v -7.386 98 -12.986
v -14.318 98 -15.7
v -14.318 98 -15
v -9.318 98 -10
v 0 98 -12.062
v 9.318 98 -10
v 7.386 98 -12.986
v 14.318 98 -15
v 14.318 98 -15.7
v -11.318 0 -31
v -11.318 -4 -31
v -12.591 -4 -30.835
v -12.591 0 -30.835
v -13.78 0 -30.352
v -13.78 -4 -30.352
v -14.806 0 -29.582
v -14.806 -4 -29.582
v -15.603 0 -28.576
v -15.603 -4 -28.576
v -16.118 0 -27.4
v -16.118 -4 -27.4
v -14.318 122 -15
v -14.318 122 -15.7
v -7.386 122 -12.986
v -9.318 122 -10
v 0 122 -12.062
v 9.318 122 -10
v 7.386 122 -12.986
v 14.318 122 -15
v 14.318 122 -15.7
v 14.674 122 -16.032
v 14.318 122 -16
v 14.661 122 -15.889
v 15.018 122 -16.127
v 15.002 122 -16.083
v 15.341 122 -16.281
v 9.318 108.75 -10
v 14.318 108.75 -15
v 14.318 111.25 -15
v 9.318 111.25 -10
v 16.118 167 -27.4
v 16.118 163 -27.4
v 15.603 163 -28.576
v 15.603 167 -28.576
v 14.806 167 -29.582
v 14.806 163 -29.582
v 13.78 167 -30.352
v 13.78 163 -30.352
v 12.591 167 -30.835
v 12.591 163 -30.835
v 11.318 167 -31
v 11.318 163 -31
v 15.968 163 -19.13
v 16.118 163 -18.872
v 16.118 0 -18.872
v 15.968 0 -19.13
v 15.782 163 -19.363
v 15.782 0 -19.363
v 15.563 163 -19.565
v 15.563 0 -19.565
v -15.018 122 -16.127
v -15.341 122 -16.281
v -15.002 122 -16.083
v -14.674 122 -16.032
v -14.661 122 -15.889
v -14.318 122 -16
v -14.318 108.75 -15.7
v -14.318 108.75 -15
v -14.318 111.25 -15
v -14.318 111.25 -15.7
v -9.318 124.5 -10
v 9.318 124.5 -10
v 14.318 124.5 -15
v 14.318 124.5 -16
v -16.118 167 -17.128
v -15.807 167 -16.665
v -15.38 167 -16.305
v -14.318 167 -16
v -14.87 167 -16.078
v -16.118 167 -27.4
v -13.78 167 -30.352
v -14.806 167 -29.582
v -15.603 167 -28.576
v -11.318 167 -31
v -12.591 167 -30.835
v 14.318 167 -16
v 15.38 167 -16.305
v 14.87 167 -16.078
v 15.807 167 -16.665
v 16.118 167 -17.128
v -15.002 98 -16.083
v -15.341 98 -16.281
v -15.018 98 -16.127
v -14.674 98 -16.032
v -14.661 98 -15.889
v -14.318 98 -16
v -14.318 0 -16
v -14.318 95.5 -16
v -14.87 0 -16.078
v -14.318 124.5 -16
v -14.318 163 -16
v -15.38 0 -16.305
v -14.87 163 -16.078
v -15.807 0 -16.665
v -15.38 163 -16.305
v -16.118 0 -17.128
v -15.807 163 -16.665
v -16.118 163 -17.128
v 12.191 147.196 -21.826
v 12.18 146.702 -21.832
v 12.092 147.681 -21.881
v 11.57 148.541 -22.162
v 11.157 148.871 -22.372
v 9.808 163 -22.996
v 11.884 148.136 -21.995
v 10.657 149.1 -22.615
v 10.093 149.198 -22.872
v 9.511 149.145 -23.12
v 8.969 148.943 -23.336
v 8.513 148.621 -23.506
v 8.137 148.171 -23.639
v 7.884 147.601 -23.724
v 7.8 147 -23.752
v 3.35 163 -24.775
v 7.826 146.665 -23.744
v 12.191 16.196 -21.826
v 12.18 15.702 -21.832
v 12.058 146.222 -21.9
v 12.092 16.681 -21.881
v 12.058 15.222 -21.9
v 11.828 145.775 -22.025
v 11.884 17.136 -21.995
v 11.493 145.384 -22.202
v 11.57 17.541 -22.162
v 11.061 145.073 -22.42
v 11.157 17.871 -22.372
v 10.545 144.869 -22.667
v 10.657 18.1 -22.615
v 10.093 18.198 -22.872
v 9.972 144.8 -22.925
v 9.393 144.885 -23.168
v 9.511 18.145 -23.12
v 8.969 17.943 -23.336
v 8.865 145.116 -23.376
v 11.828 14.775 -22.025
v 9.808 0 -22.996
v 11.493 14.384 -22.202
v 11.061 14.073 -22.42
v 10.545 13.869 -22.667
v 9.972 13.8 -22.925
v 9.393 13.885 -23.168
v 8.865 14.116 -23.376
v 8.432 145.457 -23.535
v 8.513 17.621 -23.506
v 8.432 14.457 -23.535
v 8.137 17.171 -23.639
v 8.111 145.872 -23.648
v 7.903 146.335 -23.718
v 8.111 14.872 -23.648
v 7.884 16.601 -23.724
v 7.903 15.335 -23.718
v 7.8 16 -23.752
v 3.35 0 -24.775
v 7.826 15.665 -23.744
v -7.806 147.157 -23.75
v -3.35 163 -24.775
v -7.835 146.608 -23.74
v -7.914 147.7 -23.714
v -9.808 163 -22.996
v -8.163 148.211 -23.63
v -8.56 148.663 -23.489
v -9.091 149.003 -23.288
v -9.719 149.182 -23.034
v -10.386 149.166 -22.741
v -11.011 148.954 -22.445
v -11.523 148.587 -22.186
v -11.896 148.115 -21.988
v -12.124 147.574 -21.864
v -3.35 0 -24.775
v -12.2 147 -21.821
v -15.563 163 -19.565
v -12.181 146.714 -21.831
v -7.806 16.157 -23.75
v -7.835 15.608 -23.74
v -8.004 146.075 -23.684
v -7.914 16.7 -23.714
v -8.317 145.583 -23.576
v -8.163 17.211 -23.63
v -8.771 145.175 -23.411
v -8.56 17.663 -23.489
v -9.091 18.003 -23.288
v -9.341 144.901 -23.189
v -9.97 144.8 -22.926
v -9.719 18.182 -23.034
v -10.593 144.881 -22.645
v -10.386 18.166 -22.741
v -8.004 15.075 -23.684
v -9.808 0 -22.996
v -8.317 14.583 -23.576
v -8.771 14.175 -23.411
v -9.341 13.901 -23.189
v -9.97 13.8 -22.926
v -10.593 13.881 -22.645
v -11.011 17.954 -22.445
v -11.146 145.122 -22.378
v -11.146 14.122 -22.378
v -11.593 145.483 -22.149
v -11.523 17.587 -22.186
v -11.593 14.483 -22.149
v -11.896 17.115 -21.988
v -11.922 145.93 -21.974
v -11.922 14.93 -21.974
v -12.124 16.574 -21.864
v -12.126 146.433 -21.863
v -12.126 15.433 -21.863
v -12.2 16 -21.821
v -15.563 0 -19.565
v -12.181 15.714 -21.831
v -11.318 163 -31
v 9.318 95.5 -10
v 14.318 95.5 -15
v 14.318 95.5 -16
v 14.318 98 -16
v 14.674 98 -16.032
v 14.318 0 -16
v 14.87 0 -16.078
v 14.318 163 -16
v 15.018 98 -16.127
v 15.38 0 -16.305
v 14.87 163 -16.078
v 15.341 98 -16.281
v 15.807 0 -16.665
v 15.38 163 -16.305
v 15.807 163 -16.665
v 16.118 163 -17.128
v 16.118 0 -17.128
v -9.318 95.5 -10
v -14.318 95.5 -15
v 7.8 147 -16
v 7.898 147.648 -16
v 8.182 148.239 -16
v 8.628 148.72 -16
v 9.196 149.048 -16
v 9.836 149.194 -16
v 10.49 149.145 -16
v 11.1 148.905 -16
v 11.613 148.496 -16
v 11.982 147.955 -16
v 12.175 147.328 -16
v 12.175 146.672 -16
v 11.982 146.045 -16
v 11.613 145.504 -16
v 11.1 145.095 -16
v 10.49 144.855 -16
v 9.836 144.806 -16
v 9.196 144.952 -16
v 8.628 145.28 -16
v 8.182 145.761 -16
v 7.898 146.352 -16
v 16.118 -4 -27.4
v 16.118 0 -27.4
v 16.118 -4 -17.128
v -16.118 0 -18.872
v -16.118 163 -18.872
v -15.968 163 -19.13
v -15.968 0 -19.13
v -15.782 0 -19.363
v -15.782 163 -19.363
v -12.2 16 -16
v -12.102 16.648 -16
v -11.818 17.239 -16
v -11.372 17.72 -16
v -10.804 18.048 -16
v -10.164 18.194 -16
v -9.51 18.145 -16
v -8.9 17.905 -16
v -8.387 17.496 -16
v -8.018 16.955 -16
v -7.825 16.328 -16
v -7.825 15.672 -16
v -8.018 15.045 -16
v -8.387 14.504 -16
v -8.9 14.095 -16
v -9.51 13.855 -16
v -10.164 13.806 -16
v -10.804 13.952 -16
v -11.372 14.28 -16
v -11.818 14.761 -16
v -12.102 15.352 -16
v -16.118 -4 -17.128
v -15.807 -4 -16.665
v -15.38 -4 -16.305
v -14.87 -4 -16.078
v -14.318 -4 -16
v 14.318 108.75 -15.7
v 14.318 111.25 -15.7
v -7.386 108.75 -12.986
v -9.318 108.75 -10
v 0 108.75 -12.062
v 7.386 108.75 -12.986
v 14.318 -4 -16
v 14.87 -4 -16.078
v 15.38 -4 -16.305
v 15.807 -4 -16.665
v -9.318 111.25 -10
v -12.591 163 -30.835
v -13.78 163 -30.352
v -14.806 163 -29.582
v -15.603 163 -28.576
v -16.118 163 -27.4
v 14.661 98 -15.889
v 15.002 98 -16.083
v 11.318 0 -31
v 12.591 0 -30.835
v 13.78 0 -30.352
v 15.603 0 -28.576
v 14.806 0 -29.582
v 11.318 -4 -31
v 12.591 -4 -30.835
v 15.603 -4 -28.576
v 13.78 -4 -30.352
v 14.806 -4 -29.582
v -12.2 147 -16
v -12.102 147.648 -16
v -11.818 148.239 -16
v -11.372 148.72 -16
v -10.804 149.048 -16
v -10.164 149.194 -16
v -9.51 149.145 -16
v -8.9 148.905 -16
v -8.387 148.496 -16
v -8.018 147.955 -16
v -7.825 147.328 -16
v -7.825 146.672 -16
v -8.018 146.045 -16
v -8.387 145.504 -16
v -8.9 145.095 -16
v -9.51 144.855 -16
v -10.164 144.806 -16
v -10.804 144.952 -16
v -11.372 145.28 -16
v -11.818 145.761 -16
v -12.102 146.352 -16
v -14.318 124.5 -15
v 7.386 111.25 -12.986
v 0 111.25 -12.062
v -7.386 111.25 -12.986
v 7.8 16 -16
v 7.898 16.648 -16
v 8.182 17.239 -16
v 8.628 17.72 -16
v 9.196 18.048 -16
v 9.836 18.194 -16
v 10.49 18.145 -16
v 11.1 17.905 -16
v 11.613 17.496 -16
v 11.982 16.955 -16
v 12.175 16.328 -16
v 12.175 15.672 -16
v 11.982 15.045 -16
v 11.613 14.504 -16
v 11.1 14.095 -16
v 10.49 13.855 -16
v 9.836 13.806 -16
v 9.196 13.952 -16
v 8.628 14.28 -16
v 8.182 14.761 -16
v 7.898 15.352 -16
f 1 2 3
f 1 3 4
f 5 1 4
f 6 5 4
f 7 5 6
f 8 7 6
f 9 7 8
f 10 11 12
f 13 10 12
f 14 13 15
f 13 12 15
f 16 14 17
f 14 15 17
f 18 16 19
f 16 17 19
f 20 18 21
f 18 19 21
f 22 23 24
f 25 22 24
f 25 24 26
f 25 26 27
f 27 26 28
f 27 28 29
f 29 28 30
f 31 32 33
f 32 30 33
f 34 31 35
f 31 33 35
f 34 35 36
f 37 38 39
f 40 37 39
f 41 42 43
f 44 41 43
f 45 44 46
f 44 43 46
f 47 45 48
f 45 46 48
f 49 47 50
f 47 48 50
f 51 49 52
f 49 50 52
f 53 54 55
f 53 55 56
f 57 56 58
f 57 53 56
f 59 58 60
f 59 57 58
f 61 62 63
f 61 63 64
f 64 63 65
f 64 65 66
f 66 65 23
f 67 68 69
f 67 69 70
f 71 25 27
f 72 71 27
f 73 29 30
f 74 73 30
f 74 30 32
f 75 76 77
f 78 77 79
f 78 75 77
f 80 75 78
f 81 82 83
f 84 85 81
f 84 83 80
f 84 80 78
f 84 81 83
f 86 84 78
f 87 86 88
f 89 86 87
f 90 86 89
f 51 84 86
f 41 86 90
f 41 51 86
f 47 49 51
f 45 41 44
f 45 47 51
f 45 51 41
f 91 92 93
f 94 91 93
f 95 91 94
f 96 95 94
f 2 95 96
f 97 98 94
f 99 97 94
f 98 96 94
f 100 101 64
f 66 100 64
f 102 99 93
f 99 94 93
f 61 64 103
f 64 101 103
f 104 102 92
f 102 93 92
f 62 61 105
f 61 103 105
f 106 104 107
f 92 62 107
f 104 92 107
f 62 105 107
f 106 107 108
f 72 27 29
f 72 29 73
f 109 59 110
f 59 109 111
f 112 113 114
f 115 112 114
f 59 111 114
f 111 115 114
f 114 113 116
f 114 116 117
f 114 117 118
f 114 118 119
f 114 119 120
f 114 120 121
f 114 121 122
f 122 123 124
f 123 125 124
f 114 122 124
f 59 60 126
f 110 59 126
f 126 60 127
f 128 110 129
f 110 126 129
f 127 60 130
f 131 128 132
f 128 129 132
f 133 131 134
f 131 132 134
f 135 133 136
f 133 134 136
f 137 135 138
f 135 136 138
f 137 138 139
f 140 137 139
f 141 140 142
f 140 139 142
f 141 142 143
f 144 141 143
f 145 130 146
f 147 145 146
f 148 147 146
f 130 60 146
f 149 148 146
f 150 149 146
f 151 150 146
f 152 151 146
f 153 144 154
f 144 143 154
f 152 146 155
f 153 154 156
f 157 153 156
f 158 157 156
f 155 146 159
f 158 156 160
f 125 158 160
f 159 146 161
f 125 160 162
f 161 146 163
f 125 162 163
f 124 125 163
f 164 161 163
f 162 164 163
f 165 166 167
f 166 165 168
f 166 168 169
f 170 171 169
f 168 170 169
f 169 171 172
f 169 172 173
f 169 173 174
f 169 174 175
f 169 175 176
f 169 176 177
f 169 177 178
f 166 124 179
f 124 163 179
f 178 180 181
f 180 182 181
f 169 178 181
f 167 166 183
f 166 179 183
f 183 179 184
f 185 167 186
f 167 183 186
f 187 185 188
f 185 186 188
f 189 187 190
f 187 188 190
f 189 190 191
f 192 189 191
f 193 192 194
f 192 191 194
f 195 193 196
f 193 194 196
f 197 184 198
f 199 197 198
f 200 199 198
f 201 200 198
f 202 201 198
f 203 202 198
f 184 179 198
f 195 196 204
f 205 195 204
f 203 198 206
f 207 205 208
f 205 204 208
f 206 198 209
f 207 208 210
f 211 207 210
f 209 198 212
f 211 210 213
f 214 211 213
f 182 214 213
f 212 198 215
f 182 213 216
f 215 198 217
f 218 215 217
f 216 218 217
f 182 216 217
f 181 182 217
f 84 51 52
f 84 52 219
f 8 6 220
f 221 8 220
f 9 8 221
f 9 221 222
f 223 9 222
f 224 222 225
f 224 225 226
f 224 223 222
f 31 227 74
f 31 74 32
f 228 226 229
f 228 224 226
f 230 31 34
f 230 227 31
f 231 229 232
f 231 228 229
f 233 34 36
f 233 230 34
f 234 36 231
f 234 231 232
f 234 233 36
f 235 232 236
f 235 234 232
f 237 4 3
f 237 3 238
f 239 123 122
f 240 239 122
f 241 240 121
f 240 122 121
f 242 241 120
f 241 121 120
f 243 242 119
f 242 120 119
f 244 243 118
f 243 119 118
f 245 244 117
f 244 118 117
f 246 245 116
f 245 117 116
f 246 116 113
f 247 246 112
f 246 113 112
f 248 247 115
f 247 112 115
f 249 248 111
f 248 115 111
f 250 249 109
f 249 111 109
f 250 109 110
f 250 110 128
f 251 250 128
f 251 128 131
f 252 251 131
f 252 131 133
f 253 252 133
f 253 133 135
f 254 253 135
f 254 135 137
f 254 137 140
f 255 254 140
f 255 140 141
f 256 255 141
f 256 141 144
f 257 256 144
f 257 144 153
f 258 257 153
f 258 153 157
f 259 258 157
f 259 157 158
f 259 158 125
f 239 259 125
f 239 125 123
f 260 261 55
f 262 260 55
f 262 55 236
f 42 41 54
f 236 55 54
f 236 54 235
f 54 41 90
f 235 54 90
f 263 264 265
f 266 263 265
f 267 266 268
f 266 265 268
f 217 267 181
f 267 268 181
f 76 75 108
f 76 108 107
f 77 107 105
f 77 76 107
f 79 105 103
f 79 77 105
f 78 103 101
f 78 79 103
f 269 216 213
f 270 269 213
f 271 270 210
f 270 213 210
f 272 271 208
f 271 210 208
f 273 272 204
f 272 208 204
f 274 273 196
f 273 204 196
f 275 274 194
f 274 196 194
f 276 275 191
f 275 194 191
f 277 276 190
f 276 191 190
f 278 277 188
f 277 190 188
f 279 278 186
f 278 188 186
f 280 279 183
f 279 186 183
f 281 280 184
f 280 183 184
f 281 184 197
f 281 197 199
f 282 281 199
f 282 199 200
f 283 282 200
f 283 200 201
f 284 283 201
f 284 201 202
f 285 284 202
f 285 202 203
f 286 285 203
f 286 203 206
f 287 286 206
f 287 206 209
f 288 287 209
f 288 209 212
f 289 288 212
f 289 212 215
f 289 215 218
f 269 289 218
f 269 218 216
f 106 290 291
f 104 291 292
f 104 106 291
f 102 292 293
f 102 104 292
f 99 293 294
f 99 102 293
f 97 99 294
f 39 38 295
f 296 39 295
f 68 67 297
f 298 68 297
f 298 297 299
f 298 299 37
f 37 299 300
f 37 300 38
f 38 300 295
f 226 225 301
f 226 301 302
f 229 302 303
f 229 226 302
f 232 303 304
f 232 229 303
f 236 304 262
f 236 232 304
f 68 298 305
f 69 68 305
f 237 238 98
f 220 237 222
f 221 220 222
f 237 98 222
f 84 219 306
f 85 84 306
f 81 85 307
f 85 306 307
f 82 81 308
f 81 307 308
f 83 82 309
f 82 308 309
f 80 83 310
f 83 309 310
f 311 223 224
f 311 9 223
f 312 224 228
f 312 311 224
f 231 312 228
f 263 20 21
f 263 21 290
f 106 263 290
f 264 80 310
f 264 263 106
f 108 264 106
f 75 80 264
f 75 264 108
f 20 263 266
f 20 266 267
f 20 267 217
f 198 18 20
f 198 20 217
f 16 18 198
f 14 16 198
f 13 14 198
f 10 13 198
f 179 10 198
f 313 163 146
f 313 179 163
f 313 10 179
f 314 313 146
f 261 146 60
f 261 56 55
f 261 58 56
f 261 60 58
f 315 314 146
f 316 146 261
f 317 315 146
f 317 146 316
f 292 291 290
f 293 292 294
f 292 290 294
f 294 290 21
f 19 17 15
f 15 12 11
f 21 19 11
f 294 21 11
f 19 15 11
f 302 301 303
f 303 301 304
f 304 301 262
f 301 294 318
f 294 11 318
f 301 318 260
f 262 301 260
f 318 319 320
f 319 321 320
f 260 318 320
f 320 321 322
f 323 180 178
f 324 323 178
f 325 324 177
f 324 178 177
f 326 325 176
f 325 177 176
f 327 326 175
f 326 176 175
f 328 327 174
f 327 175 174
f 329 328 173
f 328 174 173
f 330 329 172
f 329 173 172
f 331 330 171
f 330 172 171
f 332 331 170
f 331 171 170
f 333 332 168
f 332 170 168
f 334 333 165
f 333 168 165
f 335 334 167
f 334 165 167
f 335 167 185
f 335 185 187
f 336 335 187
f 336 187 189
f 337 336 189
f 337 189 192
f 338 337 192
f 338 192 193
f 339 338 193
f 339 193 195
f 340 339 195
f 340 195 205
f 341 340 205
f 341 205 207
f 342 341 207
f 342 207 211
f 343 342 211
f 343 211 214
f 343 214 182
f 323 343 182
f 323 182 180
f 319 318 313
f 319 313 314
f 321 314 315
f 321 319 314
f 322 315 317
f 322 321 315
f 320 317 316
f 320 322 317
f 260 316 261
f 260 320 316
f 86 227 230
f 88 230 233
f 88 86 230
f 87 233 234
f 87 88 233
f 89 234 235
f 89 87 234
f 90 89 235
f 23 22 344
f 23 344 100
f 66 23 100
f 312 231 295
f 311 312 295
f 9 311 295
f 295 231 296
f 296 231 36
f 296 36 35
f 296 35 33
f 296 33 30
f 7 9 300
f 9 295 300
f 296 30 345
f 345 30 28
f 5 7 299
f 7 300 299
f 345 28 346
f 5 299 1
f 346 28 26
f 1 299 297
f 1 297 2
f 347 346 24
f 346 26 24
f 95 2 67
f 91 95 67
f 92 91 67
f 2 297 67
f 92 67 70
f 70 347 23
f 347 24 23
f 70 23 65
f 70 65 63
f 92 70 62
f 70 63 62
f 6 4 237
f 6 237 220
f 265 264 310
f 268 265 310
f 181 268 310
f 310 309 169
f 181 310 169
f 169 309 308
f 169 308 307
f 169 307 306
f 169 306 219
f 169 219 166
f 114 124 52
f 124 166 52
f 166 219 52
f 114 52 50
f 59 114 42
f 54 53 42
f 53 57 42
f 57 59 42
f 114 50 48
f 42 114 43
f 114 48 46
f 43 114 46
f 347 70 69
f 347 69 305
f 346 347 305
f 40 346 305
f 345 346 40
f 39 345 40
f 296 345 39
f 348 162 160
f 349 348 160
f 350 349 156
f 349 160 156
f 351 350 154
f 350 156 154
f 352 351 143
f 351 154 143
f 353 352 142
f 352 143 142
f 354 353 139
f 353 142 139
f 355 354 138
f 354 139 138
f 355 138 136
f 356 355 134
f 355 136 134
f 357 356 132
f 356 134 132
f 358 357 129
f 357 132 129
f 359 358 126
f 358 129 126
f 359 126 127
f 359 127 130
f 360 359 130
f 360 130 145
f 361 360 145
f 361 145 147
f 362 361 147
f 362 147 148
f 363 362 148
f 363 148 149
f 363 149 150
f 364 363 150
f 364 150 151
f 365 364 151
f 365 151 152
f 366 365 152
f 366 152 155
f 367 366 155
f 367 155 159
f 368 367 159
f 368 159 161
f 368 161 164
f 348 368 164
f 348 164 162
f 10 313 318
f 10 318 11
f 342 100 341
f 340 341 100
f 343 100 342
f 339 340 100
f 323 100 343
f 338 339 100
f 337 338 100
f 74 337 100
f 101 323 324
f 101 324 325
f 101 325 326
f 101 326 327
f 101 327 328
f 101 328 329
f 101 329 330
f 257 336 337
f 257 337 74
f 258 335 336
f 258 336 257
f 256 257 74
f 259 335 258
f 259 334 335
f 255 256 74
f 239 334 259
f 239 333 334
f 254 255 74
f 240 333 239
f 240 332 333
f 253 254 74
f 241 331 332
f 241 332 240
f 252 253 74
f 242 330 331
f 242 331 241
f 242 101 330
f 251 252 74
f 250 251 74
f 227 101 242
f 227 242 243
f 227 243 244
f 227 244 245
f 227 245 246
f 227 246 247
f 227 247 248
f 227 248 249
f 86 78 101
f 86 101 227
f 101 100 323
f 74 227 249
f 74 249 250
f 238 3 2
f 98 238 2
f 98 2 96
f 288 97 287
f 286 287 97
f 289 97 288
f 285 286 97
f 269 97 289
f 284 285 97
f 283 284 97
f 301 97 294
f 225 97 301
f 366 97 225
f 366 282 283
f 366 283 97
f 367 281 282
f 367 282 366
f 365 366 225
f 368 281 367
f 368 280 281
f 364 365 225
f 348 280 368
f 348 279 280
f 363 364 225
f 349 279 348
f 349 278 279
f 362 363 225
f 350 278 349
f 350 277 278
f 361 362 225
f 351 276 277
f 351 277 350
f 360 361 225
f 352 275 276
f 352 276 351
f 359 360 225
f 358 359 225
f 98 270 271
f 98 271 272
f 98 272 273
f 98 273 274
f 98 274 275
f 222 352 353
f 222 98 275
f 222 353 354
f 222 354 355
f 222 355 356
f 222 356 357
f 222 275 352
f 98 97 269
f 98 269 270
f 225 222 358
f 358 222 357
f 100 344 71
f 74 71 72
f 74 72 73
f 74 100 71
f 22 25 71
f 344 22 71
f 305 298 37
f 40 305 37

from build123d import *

# Parameters (mm, degrees)
BOSS_EXTRUDE1_DEPTH        = 163
FILLET1_R                  = 2
BOSS_EXTRUDE3_START        = 4
BOSS_EXTRUDE3_DEPTH        = 4
BOSS_EXTRUDE4_START        = -163
BOSS_EXTRUDE4_DEPTH        = 4
FILLET2_R                  = 5
BOSS_EXTRUDE5_START        = -126
BOSS_EXTRUDE5_DEPTH        = 24
SKETCH4_W                  = 28.635642126
SKETCH4_H                  = 6
BOSS_EXTRUDE6_DEPTH        = 2.5
BOSS_EXTRUDE7_START        = -24
SKETCH4_2_W                = 28.635642126
SKETCH4_2_H                = 6
BOSS_EXTRUDE7_DEPTH        = 2.5
BOSS_EXTRUDE8_DEPTH        = 1.25
BOSS_EXTRUDE8_DEPTH_BACK   = 1.25
BOSS_EXTRUDE8_START        = -12
SKETCH4_3_W                = 28.635642126
SKETCH4_3_H                = 6
CHAMFER1_SIZE              = 5
F_4_4_4_4_DIAMETER_HOLE1_D = 4.4
SKETCH7_W                  = 27.737228758
SKETCH7_H                  = 178.87682219
CUT_EXTRUDE1_DEPTH         = 0.2
CUT_EXTRUDE2_START         = -32.635642
SKETCH7_2_W                = 27.737228758
SKETCH7_2_H                = 178.87682219
CUT_EXTRUDE2_DEPTH         = 0.2


with BuildPart() as part:
    # Sketch1 → Boss-Extrude1 (new body)
    with BuildSketch(Plane(origin=(0, 0, 0), x_dir=(1, 0, 0), z_dir=(0, 1, 0))):
        with BuildLine():
            Line((-19.209372712, 16), (19.209372712, 16))
            ThreePointArc((19.209372712, 16), (0, 25), (-19.209372712, 16))
        make_face()
    extrude(amount=BOSS_EXTRUDE1_DEPTH)

    # Fillet1
    fillet1_edges = [part.edges().sort_by_distance(p)[0] for p in [
        (19.209372712, 81.5, -16),
        (-19.209372712, 81.5, -16),
    ]]
    fillet(fillet1_edges, radius=FILLET1_R)

    # Sketch2 → Boss-Extrude3 (add)
    with BuildSketch(Plane(origin=(0, 163, 0), x_dir=(1, 0, 0), z_dir=(0, 1, 0)).offset(BOSS_EXTRUDE3_START)):
        with BuildLine():
            Line((-16.317821063, 31), (-16.317821063, 18))
            ThreePointArc((-16.317821063, 18), (-15.732034626, 16.585786438), (-14.317821063, 16))
            Line((-14.317821063, 16), (14.317821063, 16))
            ThreePointArc((14.317821063, 16), (15.732034626, 16.585786438), (16.317821063, 18))
            Line((16.317821063, 18), (16.317821063, 31))
            Line((16.317821063, 31), (-16.317821063, 31))
        make_face()
    extrude(amount=-BOSS_EXTRUDE3_DEPTH)

    # Sketch2<2> → Boss-Extrude4 (add)
    with BuildSketch(Plane(origin=(0, 163, 0), x_dir=(1, 0, 0), z_dir=(0, 1, 0)).offset(BOSS_EXTRUDE4_START)):
        with BuildLine():
            Line((16.317821063, 31), (-16.317821063, 31))
            Line((-16.317821063, 31), (-16.317821063, 18))
            ThreePointArc((-16.317821063, 18), (-16.119217166, 18.868891294), (-15.562848982, 19.565217391))
            ThreePointArc((-15.562848982, 19.565217391), (0, 25), (15.562848982, 19.565217391))
            ThreePointArc((15.562848982, 19.565217391), (16.119217166, 18.868891294), (16.317821063, 18))
            Line((16.317821063, 18), (16.317821063, 31))
        make_face()
        with BuildLine():
            ThreePointArc((-15.562848982, 19.565217391), (-16.119217166, 18.868891294), (-16.317821063, 18))
            ThreePointArc((-16.317821063, 18), (-15.732034626, 16.585786438), (-14.317821063, 16))
            Line((-14.317821063, 16), (14.317821063, 16))
            ThreePointArc((14.317821063, 16), (15.732034626, 16.585786438), (16.317821063, 18))
            ThreePointArc((16.317821063, 18), (16.119217166, 18.868891294), (15.562848982, 19.565217391))
            ThreePointArc((15.562848982, 19.565217391), (0, 25), (-15.562848982, 19.565217391))
        make_face()
    extrude(amount=-BOSS_EXTRUDE4_DEPTH)

    # Fillet2
    fillet2_edges = [part.edges().sort_by_distance(p)[0] for p in [
        (16.317821063, 165, -31),
        (-16.317821063, 165, -31),
        (16.317821063, -2, -31),
        (-16.317821063, -2, -31),
    ]]
    fillet(fillet2_edges, radius=FILLET2_R)

    # Sketch3 → Boss-Extrude5 (add)
    with BuildSketch(Plane.XZ.offset(4).offset(BOSS_EXTRUDE5_START)):
        with BuildLine():
            ThreePointArc((15.340522568, -16.281255798), (0, -12.062418831), (-15.340522568, -16.281255798))
            ThreePointArc((-15.340522568, -16.281255798), (-14.848156615, -16.071595426), (-14.317821063, -16))
            Line((-14.317821063, -16), (14.317821063, -16))
            ThreePointArc((14.317821063, -16), (14.848156615, -16.071595426), (15.340522568, -16.281255798))
        make_face()
    extrude(amount=BOSS_EXTRUDE5_DEPTH)

    # Sketch4 → Boss-Extrude6 (add)
    with BuildSketch(Plane(origin=(0, 122, 0), x_dir=(1, 0, 0), z_dir=(0, 1, 0))):
        with Locations((0, 13)):
            Rectangle(SKETCH4_W, SKETCH4_H)
    extrude(amount=BOSS_EXTRUDE6_DEPTH)

    # Sketch4<2> → Boss-Extrude7 (add)
    with BuildSketch(Plane(origin=(0, 122, 0), x_dir=(1, 0, 0), z_dir=(0, 1, 0)).offset(BOSS_EXTRUDE7_START)):
        with Locations((0, 13)):
            Rectangle(SKETCH4_2_W, SKETCH4_2_H)
    extrude(amount=-BOSS_EXTRUDE7_DEPTH)

    # Sketch4<3> → Boss-Extrude8 (add, two sides: drawn at the far end of the back side and taken through both)
    with BuildSketch(Plane(origin=(0, 122, 0), x_dir=(1, 0, 0), z_dir=(0, 1, 0)).offset(BOSS_EXTRUDE8_START - BOSS_EXTRUDE8_DEPTH_BACK)):
        with Locations((0, 13)):
            Rectangle(SKETCH4_3_W, SKETCH4_3_H)
    extrude(amount=BOSS_EXTRUDE8_DEPTH + BOSS_EXTRUDE8_DEPTH_BACK)

    # Chamfer1
    chamfer1_edges = [part.edges().sort_by_distance(p)[0] for p in [
        (-14.317821063, 123.25, -10),
        (14.317821063, 123.25, -10),
        (14.317821063, 96.75, -10),
        (-14.317821063, 96.75, -10),
        (-14.317821063, 110, -10),
        (14.317821063, 110, -10),
    ]]
    chamfer(chamfer1_edges, length=CHAMFER1_SIZE)

    # Ø4.4 (4.4) Diameter Hole1 (through all)
    with Locations(Plane.XY.offset(-16)):
        with Locations((-10, 147), (10, 147), (10, 16), (-10, 16)):
            Hole(F_4_4_4_4_DIAMETER_HOLE1_D / 2)

    # Sketch7 → Cut-Extrude1 (cut)
    with BuildSketch(Plane.ZY.offset(16.317821063)):
        with Locations((-24.632131786, 79.951369179)):
            Rectangle(SKETCH7_W, SKETCH7_H)
    extrude(amount=-CUT_EXTRUDE1_DEPTH, mode=Mode.SUBTRACT)

    # Sketch7<2> → Cut-Extrude2 (cut)
    with BuildSketch(Plane.ZY.offset(16.317821063).offset(CUT_EXTRUDE2_START)):
        with Locations((-24.632131786, 79.951369179)):
            Rectangle(SKETCH7_2_W, SKETCH7_2_H)
    extrude(amount=CUT_EXTRUDE2_DEPTH, mode=Mode.SUBTRACT)


solid = part.part
